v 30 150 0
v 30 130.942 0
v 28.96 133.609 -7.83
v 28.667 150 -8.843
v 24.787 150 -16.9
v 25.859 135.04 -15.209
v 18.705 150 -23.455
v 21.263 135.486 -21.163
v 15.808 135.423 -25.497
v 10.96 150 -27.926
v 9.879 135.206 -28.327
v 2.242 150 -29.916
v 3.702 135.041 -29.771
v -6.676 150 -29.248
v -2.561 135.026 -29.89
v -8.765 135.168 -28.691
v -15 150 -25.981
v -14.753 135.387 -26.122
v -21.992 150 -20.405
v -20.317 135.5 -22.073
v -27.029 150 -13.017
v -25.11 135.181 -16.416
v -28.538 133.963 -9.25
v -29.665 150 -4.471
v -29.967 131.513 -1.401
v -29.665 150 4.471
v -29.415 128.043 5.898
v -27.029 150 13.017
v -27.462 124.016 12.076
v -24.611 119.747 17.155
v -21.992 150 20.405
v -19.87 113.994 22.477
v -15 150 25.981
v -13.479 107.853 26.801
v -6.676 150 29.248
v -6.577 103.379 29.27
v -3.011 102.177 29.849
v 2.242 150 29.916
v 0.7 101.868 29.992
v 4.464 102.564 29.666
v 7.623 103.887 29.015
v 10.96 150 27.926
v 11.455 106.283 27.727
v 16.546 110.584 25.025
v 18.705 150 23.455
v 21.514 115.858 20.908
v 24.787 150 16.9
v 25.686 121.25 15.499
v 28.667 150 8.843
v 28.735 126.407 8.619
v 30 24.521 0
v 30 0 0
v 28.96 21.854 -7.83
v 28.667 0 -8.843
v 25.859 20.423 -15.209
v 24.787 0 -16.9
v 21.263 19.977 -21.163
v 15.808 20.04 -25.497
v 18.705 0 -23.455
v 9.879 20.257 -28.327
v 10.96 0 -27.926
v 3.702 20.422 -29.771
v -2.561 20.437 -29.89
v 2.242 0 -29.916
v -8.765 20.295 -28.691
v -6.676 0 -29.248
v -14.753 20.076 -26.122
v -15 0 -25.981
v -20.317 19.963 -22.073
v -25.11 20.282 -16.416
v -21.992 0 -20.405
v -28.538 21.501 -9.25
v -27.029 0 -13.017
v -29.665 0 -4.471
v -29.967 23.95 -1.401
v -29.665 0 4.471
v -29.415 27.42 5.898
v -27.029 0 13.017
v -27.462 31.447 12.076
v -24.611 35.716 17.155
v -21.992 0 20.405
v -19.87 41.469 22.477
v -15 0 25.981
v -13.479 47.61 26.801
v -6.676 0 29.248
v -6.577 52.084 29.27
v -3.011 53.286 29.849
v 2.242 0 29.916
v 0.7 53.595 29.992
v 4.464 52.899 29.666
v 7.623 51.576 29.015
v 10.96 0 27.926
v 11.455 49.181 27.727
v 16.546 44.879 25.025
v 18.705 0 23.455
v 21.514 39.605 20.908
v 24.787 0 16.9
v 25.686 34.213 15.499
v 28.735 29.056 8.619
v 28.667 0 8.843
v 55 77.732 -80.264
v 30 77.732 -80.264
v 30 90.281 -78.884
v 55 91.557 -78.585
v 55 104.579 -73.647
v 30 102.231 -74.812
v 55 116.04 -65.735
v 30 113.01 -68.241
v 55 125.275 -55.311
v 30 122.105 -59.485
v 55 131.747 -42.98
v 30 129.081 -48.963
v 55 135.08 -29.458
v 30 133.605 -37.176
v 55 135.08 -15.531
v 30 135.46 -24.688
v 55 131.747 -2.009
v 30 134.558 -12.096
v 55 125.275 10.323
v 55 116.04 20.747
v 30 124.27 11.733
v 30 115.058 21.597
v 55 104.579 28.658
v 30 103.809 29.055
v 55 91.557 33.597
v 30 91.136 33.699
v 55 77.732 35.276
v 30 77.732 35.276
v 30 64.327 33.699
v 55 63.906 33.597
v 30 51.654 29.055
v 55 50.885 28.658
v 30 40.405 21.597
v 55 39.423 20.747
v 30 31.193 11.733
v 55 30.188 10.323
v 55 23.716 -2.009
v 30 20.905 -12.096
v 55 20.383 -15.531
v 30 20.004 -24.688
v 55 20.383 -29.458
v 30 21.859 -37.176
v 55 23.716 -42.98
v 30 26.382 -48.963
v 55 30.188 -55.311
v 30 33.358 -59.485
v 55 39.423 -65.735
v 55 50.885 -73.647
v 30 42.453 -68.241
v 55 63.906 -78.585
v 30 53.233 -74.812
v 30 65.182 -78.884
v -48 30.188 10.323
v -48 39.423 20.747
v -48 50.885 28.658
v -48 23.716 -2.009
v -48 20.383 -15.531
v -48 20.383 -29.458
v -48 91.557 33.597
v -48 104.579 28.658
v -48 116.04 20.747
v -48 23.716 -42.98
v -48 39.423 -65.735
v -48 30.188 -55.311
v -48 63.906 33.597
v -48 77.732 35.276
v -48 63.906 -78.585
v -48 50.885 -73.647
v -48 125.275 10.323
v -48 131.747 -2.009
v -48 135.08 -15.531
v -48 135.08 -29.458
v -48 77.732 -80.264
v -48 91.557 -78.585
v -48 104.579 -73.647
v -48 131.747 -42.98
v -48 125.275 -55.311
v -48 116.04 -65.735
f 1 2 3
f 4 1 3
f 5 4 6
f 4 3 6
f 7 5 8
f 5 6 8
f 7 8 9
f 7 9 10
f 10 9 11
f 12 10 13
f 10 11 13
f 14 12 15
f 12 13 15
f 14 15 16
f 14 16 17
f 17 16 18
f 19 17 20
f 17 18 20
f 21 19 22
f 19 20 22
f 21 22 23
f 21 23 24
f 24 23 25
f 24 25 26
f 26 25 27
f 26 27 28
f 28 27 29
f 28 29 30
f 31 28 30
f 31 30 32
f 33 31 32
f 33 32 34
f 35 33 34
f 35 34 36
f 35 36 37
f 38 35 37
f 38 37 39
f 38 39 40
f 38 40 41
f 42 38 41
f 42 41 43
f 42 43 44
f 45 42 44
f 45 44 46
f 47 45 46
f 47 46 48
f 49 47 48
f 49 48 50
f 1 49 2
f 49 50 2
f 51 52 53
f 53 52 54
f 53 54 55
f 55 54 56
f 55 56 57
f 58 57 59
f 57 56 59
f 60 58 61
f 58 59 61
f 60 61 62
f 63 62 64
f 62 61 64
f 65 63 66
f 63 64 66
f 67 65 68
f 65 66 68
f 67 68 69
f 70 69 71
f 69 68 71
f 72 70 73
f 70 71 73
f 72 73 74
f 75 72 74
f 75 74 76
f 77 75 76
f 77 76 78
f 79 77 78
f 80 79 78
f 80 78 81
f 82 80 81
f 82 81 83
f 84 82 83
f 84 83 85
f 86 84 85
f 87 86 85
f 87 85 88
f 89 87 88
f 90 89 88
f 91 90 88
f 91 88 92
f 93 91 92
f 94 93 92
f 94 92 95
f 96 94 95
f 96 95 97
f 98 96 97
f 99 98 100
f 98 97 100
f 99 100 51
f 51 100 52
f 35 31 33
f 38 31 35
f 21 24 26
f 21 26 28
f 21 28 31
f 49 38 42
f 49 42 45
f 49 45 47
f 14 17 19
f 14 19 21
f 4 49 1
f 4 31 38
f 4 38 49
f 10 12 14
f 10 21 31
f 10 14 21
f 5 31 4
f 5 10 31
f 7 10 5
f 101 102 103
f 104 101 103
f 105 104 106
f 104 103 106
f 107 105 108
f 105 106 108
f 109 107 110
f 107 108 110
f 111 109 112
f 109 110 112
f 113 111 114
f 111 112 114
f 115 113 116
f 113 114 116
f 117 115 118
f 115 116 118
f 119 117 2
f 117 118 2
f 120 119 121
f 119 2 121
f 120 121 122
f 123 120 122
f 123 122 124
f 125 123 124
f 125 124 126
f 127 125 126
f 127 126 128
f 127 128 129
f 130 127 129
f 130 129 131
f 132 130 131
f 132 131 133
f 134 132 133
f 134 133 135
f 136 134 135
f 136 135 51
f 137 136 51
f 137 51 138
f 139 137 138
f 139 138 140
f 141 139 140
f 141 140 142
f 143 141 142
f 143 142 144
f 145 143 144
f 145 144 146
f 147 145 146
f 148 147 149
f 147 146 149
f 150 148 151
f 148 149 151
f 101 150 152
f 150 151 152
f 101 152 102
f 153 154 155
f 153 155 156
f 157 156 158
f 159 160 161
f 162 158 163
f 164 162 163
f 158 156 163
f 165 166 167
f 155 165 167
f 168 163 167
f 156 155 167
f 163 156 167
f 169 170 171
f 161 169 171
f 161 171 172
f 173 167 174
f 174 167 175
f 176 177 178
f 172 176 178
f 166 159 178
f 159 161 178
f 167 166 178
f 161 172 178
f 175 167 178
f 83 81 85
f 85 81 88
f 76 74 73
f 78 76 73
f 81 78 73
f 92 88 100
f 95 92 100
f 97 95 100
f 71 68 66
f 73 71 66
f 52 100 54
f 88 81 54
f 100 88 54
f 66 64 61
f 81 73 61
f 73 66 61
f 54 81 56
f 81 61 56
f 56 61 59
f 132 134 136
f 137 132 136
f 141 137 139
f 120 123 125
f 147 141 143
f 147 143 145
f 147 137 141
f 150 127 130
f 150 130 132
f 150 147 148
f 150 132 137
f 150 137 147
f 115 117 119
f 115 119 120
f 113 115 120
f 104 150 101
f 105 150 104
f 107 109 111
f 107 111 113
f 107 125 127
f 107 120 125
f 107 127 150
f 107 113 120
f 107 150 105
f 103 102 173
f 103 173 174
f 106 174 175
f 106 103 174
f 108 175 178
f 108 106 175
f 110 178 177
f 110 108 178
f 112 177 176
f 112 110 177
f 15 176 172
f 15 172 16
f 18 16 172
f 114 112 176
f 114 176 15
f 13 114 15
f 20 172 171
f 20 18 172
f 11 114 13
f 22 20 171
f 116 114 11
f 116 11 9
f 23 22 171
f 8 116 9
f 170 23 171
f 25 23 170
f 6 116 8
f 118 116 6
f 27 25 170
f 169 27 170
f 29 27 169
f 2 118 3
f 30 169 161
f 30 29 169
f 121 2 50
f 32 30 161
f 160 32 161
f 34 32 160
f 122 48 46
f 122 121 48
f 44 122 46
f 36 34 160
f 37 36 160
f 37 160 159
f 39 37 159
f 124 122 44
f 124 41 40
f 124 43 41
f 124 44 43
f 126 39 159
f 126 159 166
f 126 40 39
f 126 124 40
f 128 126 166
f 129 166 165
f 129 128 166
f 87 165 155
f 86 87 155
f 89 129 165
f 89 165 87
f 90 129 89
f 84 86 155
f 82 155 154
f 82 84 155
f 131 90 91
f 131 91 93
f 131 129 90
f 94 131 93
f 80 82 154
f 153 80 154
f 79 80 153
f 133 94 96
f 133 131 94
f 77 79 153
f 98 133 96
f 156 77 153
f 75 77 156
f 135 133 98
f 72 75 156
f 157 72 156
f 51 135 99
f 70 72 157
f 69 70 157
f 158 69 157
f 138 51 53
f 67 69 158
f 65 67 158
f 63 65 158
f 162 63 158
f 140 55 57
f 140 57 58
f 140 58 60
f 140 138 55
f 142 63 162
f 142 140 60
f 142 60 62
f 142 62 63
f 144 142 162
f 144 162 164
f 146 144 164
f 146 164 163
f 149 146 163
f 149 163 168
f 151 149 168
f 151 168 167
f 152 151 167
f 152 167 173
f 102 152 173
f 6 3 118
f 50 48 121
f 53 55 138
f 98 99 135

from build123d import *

# Parameters (mm, degrees)
SKETCH1_R                = 30
BOSS_EXTRUDE1_DEPTH      = 150
SKETCH3_R                = 57.769734486
BOSS_EXTRUDE2_DEPTH      = 25
BOSS_EXTRUDE2_DEPTH_BACK = 78


with BuildPart() as part:
    # Sketch1 → Boss-Extrude1 (new body)
    with BuildSketch(Plane(origin=(0, 0, 0), x_dir=(1, 0, 0), z_dir=(0, 1, 0))):
        Circle(SKETCH1_R)
    extrude(amount=BOSS_EXTRUDE1_DEPTH)

    # Sketch3 → Boss-Extrude2 (add, two sides)
    with BuildSketch(Plane(origin=(30, 0, 0), x_dir=(0, 0, -1), z_dir=(1, 0, 0))) as boss_extrude2_sk:
        with Locations((22.49423093, 77.731577971)):
            Circle(SKETCH3_R)
    extrude(amount=BOSS_EXTRUDE2_DEPTH)
    extrude(boss_extrude2_sk.sketch, amount=-BOSS_EXTRUDE2_DEPTH_BACK)


solid = part.part
